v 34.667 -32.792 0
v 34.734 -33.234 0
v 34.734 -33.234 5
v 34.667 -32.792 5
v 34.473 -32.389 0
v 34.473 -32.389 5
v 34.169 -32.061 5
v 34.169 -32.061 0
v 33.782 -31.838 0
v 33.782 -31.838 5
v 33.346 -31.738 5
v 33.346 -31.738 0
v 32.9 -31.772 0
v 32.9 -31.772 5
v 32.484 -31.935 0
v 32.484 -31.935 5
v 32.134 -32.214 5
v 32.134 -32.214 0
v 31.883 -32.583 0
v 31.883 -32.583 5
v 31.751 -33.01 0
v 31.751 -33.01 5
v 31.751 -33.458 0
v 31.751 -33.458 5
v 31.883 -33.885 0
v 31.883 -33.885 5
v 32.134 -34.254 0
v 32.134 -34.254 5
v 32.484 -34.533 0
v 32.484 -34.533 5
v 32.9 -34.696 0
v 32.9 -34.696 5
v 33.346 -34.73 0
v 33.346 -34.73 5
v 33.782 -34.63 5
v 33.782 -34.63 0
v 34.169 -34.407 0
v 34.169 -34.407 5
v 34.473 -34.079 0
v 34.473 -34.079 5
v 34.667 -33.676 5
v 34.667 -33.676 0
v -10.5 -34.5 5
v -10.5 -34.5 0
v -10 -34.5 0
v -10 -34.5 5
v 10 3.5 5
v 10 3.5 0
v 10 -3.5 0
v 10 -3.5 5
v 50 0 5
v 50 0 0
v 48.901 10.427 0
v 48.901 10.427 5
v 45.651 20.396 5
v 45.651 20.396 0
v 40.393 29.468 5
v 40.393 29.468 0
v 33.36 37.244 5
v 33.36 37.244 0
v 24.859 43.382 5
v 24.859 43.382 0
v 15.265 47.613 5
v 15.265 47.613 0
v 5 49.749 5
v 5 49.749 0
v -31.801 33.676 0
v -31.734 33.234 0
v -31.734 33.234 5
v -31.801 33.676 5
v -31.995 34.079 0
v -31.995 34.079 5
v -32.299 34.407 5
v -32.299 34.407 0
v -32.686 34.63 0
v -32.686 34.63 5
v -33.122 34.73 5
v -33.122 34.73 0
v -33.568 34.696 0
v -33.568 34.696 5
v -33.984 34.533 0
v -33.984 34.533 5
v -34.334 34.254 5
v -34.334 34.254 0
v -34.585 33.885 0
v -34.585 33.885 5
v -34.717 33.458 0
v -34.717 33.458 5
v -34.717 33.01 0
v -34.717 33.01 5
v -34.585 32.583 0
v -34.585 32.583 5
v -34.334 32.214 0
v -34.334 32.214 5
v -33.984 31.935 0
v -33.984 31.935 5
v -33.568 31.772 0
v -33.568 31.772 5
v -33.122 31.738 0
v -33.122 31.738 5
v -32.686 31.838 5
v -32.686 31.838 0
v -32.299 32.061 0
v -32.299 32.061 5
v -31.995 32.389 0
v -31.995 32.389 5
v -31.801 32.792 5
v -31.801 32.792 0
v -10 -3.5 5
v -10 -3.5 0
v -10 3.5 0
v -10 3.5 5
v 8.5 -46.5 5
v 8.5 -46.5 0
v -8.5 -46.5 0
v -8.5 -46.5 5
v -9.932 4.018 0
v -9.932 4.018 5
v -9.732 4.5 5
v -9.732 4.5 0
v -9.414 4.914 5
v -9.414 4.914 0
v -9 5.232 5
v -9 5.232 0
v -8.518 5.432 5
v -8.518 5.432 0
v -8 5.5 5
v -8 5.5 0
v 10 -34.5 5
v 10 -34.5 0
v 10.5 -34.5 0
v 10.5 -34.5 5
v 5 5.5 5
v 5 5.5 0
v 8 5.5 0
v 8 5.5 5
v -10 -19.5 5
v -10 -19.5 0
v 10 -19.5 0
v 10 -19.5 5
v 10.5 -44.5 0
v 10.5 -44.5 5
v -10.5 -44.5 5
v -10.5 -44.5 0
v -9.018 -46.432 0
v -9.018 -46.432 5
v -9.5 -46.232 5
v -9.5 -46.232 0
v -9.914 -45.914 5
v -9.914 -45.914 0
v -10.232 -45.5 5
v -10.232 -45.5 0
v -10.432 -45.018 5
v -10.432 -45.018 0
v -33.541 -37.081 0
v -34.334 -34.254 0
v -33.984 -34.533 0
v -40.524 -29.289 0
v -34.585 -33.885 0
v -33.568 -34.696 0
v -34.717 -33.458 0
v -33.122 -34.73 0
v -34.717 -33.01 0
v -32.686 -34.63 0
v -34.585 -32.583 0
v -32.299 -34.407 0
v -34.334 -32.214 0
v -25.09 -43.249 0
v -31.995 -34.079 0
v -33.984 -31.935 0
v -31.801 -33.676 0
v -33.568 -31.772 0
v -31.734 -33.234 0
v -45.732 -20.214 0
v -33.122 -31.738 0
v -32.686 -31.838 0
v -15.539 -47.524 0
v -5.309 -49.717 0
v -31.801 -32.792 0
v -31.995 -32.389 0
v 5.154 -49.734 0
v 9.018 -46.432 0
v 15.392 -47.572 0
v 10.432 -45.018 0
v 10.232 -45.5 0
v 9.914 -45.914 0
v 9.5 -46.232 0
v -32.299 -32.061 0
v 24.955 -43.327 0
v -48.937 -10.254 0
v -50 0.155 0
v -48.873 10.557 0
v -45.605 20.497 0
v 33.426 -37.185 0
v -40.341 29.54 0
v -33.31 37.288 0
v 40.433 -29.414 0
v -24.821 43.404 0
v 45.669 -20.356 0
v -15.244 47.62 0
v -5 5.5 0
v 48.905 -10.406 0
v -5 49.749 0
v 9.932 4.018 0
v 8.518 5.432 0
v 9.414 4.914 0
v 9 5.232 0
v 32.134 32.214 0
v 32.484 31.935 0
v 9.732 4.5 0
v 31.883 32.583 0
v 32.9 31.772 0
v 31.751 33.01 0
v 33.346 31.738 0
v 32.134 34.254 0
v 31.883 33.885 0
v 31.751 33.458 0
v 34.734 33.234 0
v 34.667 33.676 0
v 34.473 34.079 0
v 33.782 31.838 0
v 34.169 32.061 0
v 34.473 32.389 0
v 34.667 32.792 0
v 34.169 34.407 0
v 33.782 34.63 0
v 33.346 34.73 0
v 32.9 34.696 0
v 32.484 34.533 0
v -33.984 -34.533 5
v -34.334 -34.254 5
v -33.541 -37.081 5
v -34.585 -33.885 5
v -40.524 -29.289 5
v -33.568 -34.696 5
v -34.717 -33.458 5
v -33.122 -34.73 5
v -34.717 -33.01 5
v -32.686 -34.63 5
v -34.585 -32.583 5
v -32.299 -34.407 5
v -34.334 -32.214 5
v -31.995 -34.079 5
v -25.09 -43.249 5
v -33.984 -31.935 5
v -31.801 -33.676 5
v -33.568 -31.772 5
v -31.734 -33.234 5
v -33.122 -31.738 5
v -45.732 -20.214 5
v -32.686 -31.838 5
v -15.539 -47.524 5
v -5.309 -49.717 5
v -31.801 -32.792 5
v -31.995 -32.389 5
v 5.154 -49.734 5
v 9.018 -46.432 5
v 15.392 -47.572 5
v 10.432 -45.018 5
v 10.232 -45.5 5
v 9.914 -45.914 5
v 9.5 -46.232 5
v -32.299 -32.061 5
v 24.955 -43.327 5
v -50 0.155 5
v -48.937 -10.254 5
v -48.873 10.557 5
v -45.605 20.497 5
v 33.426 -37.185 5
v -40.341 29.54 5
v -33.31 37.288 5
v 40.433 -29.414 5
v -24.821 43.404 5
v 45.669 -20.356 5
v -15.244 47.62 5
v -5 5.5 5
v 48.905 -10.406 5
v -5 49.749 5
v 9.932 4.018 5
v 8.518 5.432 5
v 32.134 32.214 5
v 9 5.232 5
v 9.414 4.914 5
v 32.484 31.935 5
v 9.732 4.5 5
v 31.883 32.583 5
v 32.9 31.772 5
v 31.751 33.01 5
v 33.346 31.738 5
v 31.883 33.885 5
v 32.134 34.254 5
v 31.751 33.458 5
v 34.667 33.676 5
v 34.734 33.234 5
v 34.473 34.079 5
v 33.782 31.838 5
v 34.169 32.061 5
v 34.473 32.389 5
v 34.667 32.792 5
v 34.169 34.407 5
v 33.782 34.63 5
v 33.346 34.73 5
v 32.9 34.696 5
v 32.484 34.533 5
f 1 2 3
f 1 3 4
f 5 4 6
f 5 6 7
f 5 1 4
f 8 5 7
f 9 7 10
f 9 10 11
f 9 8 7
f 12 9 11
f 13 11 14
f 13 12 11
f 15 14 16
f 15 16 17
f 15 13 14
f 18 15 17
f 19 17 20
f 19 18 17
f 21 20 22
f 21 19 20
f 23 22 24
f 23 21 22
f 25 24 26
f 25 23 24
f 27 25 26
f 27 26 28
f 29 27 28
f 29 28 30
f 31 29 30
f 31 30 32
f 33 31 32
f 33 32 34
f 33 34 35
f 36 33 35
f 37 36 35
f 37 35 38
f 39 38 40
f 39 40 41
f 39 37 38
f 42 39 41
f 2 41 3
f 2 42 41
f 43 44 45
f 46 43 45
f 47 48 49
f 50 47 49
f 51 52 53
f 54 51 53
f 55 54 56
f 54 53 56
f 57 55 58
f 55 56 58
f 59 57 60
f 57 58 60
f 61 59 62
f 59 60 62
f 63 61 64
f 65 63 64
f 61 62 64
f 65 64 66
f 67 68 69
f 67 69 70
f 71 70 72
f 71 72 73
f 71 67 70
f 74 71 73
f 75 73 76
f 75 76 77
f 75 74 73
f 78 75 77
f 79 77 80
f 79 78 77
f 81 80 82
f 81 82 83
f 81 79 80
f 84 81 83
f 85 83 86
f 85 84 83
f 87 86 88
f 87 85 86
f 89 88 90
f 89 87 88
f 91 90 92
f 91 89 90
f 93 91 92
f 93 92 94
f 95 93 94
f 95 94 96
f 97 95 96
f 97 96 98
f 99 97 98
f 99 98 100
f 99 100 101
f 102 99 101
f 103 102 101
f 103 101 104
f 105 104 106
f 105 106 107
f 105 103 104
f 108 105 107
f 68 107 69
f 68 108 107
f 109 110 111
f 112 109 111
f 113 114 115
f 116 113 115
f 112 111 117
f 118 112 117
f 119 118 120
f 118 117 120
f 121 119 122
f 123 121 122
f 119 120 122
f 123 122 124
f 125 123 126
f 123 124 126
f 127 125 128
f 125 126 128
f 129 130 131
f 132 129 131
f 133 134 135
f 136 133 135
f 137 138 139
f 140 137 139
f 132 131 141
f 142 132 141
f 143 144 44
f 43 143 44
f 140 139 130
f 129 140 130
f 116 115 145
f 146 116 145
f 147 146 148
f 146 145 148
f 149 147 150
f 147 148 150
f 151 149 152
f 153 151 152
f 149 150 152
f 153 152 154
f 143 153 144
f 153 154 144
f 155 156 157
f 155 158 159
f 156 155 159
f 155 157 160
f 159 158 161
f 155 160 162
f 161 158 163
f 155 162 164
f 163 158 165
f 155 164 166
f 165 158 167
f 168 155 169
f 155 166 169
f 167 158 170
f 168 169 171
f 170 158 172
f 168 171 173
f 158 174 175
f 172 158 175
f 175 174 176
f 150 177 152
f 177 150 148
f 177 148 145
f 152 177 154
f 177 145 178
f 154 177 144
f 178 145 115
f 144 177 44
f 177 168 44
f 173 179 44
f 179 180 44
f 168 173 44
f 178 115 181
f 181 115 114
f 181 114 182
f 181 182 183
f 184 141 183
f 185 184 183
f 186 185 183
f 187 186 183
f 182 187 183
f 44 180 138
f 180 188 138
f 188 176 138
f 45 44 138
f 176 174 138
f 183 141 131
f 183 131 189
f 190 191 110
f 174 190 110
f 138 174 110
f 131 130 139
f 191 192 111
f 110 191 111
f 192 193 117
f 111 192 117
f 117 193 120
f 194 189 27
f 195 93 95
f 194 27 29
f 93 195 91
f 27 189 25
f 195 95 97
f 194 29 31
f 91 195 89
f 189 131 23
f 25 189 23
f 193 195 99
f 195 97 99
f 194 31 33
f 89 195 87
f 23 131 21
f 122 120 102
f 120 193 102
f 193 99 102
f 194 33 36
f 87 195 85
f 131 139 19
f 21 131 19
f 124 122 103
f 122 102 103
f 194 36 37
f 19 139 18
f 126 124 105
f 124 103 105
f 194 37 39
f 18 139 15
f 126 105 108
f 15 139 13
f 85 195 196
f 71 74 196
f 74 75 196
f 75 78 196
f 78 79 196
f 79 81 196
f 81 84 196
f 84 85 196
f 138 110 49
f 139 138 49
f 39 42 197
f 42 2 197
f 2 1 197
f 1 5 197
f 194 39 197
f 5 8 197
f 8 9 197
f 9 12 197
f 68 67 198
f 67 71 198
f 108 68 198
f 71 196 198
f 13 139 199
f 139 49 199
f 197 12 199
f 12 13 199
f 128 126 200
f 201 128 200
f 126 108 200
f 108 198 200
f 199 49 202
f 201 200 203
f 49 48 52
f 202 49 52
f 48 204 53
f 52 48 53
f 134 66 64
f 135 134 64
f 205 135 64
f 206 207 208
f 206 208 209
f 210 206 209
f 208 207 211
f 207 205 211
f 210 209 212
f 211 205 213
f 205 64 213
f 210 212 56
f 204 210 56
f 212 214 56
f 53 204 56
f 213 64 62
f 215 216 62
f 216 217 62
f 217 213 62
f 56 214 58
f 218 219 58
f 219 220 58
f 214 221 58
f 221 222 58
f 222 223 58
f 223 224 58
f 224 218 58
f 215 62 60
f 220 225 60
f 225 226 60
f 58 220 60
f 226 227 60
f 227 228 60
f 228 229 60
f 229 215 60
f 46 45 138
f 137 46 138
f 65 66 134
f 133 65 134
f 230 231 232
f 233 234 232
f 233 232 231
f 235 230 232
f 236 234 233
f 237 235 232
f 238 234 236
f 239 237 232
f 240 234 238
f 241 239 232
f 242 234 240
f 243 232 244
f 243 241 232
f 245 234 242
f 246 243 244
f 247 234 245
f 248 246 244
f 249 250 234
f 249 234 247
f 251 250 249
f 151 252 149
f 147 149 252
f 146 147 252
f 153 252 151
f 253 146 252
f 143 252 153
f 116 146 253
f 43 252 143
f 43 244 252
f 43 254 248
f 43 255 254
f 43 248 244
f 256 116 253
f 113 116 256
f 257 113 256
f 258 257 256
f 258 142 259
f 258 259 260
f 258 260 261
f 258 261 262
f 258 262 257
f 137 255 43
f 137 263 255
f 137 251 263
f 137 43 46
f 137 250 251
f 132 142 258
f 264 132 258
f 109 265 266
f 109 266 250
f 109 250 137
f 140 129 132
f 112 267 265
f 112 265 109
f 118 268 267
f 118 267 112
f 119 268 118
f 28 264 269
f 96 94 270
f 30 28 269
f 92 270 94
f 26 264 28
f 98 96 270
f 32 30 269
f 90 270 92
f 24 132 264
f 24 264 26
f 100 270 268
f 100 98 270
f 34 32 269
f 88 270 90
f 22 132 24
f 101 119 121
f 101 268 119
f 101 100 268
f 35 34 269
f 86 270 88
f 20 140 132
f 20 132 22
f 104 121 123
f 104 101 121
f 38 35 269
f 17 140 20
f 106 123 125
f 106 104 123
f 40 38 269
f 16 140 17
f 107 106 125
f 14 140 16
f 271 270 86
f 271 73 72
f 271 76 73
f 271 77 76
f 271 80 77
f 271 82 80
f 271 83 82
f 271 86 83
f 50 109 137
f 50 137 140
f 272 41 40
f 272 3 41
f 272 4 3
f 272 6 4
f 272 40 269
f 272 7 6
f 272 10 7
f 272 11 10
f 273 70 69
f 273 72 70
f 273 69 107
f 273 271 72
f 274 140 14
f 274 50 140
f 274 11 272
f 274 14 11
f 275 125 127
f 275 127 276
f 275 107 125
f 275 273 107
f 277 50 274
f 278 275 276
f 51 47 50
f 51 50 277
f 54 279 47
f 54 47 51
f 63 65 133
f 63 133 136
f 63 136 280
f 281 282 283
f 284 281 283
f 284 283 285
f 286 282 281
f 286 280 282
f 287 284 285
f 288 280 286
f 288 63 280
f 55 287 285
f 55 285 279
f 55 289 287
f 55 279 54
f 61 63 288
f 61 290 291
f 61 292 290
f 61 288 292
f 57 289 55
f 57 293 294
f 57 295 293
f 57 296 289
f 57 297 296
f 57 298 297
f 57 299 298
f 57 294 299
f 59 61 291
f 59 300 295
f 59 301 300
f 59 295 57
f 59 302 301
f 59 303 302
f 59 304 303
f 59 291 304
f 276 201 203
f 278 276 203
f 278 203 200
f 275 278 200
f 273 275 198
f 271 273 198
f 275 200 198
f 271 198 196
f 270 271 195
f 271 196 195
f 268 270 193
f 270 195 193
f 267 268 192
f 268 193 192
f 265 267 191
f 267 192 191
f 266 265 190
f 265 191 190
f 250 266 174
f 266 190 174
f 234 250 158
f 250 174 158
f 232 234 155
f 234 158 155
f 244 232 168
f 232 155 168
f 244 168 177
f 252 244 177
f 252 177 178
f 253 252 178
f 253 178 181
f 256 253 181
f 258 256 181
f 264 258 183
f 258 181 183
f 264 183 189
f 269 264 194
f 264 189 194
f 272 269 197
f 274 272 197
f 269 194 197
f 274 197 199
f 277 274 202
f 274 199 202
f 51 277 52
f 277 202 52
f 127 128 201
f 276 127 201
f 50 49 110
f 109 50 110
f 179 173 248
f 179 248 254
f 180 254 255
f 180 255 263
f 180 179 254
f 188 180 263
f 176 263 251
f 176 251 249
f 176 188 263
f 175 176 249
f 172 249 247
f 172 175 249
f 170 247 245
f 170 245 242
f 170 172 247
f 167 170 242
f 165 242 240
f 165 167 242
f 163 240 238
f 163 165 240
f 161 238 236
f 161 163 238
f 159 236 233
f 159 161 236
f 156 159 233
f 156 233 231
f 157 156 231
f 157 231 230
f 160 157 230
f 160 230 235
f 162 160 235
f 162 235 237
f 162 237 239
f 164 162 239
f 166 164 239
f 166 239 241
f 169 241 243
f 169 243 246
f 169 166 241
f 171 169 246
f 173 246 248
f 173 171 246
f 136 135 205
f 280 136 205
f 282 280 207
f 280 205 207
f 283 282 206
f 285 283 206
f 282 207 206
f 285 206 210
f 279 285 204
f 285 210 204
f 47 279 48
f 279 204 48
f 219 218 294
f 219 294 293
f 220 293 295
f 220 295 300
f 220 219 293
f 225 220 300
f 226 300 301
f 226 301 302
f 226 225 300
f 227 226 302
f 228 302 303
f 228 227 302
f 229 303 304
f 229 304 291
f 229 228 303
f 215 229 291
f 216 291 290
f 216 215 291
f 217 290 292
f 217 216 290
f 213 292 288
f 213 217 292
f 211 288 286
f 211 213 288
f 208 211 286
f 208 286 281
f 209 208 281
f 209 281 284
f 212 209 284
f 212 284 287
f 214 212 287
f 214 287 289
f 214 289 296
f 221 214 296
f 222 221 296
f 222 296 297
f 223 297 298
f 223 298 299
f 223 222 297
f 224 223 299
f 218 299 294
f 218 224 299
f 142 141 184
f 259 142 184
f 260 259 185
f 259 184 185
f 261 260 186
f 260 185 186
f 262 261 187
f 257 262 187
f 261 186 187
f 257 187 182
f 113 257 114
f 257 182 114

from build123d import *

# Parameters (mm, degrees)
SKETCH_1_R      = 1.5
EXTRUDE_1_DEPTH = 5


with BuildPart() as part:
    # 草图1 → 凸台-拉伸1 (new body)
    with BuildSketch(Plane.XY):
        with BuildLine():
            Line((-5, 5.5), (-5, 49.749371855))
            ThreePointArc((-5, 49.749371855), (-33.541019662, -37.080992435), (50, 0))
            ThreePointArc((50, 0), (37.080992435, 33.541019662), (5, 49.749371855))
            Line((5, 49.749371855), (5, 5.5))
            Line((5, 5.5), (8, 5.5))
            ThreePointArc((8, 5.5), (9.414213562, 4.914213562), (10, 3.5))
            Line((10, 3.5), (10, -3.5))
            Line((10, -3.5), (-10, -3.5))
            Line((-10, -3.5), (-10, 3.5))
            ThreePointArc((-10, 3.5), (-9.414213562, 4.914213562), (-8, 5.5))
            Line((-8, 5.5), (-5, 5.5))
        make_face()
        with Locations((-33.234018716, -33.234018716)):
            Circle(SKETCH_1_R, mode=Mode.SUBTRACT)
        with BuildLine():
            Line((-10.5, -34.5), (-10, -34.5))
            Line((-10, -34.5), (-10, -19.5))
            Line((-10, -19.5), (10, -19.5))
            Line((10, -19.5), (10, -34.5))
            Line((10, -34.5), (10.5, -34.5))
            Line((10.5, -34.5), (10.5, -44.5))
            ThreePointArc((10.5, -44.5), (9.914213562, -45.914213562), (8.5, -46.5))
            Line((8.5, -46.5), (-8.5, -46.5))
            ThreePointArc((-8.5, -46.5), (-9.914213562, -45.914213562), (-10.5, -44.5))
            Line((-10.5, -44.5), (-10.5, -34.5))
        make_face(mode=Mode.SUBTRACT)
        with Locations((33.234018716, -33.234018716)):
            Circle(SKETCH_1_R, mode=Mode.SUBTRACT)
        with Locations((-33.234018716, 33.234018716)):
            Circle(SKETCH_1_R, mode=Mode.SUBTRACT)
        with Locations((33.234018716, 33.234018716)):
            Circle(SKETCH_1_R, mode=Mode.SUBTRACT)
    extrude(amount=EXTRUDE_1_DEPTH)


solid = part.part
